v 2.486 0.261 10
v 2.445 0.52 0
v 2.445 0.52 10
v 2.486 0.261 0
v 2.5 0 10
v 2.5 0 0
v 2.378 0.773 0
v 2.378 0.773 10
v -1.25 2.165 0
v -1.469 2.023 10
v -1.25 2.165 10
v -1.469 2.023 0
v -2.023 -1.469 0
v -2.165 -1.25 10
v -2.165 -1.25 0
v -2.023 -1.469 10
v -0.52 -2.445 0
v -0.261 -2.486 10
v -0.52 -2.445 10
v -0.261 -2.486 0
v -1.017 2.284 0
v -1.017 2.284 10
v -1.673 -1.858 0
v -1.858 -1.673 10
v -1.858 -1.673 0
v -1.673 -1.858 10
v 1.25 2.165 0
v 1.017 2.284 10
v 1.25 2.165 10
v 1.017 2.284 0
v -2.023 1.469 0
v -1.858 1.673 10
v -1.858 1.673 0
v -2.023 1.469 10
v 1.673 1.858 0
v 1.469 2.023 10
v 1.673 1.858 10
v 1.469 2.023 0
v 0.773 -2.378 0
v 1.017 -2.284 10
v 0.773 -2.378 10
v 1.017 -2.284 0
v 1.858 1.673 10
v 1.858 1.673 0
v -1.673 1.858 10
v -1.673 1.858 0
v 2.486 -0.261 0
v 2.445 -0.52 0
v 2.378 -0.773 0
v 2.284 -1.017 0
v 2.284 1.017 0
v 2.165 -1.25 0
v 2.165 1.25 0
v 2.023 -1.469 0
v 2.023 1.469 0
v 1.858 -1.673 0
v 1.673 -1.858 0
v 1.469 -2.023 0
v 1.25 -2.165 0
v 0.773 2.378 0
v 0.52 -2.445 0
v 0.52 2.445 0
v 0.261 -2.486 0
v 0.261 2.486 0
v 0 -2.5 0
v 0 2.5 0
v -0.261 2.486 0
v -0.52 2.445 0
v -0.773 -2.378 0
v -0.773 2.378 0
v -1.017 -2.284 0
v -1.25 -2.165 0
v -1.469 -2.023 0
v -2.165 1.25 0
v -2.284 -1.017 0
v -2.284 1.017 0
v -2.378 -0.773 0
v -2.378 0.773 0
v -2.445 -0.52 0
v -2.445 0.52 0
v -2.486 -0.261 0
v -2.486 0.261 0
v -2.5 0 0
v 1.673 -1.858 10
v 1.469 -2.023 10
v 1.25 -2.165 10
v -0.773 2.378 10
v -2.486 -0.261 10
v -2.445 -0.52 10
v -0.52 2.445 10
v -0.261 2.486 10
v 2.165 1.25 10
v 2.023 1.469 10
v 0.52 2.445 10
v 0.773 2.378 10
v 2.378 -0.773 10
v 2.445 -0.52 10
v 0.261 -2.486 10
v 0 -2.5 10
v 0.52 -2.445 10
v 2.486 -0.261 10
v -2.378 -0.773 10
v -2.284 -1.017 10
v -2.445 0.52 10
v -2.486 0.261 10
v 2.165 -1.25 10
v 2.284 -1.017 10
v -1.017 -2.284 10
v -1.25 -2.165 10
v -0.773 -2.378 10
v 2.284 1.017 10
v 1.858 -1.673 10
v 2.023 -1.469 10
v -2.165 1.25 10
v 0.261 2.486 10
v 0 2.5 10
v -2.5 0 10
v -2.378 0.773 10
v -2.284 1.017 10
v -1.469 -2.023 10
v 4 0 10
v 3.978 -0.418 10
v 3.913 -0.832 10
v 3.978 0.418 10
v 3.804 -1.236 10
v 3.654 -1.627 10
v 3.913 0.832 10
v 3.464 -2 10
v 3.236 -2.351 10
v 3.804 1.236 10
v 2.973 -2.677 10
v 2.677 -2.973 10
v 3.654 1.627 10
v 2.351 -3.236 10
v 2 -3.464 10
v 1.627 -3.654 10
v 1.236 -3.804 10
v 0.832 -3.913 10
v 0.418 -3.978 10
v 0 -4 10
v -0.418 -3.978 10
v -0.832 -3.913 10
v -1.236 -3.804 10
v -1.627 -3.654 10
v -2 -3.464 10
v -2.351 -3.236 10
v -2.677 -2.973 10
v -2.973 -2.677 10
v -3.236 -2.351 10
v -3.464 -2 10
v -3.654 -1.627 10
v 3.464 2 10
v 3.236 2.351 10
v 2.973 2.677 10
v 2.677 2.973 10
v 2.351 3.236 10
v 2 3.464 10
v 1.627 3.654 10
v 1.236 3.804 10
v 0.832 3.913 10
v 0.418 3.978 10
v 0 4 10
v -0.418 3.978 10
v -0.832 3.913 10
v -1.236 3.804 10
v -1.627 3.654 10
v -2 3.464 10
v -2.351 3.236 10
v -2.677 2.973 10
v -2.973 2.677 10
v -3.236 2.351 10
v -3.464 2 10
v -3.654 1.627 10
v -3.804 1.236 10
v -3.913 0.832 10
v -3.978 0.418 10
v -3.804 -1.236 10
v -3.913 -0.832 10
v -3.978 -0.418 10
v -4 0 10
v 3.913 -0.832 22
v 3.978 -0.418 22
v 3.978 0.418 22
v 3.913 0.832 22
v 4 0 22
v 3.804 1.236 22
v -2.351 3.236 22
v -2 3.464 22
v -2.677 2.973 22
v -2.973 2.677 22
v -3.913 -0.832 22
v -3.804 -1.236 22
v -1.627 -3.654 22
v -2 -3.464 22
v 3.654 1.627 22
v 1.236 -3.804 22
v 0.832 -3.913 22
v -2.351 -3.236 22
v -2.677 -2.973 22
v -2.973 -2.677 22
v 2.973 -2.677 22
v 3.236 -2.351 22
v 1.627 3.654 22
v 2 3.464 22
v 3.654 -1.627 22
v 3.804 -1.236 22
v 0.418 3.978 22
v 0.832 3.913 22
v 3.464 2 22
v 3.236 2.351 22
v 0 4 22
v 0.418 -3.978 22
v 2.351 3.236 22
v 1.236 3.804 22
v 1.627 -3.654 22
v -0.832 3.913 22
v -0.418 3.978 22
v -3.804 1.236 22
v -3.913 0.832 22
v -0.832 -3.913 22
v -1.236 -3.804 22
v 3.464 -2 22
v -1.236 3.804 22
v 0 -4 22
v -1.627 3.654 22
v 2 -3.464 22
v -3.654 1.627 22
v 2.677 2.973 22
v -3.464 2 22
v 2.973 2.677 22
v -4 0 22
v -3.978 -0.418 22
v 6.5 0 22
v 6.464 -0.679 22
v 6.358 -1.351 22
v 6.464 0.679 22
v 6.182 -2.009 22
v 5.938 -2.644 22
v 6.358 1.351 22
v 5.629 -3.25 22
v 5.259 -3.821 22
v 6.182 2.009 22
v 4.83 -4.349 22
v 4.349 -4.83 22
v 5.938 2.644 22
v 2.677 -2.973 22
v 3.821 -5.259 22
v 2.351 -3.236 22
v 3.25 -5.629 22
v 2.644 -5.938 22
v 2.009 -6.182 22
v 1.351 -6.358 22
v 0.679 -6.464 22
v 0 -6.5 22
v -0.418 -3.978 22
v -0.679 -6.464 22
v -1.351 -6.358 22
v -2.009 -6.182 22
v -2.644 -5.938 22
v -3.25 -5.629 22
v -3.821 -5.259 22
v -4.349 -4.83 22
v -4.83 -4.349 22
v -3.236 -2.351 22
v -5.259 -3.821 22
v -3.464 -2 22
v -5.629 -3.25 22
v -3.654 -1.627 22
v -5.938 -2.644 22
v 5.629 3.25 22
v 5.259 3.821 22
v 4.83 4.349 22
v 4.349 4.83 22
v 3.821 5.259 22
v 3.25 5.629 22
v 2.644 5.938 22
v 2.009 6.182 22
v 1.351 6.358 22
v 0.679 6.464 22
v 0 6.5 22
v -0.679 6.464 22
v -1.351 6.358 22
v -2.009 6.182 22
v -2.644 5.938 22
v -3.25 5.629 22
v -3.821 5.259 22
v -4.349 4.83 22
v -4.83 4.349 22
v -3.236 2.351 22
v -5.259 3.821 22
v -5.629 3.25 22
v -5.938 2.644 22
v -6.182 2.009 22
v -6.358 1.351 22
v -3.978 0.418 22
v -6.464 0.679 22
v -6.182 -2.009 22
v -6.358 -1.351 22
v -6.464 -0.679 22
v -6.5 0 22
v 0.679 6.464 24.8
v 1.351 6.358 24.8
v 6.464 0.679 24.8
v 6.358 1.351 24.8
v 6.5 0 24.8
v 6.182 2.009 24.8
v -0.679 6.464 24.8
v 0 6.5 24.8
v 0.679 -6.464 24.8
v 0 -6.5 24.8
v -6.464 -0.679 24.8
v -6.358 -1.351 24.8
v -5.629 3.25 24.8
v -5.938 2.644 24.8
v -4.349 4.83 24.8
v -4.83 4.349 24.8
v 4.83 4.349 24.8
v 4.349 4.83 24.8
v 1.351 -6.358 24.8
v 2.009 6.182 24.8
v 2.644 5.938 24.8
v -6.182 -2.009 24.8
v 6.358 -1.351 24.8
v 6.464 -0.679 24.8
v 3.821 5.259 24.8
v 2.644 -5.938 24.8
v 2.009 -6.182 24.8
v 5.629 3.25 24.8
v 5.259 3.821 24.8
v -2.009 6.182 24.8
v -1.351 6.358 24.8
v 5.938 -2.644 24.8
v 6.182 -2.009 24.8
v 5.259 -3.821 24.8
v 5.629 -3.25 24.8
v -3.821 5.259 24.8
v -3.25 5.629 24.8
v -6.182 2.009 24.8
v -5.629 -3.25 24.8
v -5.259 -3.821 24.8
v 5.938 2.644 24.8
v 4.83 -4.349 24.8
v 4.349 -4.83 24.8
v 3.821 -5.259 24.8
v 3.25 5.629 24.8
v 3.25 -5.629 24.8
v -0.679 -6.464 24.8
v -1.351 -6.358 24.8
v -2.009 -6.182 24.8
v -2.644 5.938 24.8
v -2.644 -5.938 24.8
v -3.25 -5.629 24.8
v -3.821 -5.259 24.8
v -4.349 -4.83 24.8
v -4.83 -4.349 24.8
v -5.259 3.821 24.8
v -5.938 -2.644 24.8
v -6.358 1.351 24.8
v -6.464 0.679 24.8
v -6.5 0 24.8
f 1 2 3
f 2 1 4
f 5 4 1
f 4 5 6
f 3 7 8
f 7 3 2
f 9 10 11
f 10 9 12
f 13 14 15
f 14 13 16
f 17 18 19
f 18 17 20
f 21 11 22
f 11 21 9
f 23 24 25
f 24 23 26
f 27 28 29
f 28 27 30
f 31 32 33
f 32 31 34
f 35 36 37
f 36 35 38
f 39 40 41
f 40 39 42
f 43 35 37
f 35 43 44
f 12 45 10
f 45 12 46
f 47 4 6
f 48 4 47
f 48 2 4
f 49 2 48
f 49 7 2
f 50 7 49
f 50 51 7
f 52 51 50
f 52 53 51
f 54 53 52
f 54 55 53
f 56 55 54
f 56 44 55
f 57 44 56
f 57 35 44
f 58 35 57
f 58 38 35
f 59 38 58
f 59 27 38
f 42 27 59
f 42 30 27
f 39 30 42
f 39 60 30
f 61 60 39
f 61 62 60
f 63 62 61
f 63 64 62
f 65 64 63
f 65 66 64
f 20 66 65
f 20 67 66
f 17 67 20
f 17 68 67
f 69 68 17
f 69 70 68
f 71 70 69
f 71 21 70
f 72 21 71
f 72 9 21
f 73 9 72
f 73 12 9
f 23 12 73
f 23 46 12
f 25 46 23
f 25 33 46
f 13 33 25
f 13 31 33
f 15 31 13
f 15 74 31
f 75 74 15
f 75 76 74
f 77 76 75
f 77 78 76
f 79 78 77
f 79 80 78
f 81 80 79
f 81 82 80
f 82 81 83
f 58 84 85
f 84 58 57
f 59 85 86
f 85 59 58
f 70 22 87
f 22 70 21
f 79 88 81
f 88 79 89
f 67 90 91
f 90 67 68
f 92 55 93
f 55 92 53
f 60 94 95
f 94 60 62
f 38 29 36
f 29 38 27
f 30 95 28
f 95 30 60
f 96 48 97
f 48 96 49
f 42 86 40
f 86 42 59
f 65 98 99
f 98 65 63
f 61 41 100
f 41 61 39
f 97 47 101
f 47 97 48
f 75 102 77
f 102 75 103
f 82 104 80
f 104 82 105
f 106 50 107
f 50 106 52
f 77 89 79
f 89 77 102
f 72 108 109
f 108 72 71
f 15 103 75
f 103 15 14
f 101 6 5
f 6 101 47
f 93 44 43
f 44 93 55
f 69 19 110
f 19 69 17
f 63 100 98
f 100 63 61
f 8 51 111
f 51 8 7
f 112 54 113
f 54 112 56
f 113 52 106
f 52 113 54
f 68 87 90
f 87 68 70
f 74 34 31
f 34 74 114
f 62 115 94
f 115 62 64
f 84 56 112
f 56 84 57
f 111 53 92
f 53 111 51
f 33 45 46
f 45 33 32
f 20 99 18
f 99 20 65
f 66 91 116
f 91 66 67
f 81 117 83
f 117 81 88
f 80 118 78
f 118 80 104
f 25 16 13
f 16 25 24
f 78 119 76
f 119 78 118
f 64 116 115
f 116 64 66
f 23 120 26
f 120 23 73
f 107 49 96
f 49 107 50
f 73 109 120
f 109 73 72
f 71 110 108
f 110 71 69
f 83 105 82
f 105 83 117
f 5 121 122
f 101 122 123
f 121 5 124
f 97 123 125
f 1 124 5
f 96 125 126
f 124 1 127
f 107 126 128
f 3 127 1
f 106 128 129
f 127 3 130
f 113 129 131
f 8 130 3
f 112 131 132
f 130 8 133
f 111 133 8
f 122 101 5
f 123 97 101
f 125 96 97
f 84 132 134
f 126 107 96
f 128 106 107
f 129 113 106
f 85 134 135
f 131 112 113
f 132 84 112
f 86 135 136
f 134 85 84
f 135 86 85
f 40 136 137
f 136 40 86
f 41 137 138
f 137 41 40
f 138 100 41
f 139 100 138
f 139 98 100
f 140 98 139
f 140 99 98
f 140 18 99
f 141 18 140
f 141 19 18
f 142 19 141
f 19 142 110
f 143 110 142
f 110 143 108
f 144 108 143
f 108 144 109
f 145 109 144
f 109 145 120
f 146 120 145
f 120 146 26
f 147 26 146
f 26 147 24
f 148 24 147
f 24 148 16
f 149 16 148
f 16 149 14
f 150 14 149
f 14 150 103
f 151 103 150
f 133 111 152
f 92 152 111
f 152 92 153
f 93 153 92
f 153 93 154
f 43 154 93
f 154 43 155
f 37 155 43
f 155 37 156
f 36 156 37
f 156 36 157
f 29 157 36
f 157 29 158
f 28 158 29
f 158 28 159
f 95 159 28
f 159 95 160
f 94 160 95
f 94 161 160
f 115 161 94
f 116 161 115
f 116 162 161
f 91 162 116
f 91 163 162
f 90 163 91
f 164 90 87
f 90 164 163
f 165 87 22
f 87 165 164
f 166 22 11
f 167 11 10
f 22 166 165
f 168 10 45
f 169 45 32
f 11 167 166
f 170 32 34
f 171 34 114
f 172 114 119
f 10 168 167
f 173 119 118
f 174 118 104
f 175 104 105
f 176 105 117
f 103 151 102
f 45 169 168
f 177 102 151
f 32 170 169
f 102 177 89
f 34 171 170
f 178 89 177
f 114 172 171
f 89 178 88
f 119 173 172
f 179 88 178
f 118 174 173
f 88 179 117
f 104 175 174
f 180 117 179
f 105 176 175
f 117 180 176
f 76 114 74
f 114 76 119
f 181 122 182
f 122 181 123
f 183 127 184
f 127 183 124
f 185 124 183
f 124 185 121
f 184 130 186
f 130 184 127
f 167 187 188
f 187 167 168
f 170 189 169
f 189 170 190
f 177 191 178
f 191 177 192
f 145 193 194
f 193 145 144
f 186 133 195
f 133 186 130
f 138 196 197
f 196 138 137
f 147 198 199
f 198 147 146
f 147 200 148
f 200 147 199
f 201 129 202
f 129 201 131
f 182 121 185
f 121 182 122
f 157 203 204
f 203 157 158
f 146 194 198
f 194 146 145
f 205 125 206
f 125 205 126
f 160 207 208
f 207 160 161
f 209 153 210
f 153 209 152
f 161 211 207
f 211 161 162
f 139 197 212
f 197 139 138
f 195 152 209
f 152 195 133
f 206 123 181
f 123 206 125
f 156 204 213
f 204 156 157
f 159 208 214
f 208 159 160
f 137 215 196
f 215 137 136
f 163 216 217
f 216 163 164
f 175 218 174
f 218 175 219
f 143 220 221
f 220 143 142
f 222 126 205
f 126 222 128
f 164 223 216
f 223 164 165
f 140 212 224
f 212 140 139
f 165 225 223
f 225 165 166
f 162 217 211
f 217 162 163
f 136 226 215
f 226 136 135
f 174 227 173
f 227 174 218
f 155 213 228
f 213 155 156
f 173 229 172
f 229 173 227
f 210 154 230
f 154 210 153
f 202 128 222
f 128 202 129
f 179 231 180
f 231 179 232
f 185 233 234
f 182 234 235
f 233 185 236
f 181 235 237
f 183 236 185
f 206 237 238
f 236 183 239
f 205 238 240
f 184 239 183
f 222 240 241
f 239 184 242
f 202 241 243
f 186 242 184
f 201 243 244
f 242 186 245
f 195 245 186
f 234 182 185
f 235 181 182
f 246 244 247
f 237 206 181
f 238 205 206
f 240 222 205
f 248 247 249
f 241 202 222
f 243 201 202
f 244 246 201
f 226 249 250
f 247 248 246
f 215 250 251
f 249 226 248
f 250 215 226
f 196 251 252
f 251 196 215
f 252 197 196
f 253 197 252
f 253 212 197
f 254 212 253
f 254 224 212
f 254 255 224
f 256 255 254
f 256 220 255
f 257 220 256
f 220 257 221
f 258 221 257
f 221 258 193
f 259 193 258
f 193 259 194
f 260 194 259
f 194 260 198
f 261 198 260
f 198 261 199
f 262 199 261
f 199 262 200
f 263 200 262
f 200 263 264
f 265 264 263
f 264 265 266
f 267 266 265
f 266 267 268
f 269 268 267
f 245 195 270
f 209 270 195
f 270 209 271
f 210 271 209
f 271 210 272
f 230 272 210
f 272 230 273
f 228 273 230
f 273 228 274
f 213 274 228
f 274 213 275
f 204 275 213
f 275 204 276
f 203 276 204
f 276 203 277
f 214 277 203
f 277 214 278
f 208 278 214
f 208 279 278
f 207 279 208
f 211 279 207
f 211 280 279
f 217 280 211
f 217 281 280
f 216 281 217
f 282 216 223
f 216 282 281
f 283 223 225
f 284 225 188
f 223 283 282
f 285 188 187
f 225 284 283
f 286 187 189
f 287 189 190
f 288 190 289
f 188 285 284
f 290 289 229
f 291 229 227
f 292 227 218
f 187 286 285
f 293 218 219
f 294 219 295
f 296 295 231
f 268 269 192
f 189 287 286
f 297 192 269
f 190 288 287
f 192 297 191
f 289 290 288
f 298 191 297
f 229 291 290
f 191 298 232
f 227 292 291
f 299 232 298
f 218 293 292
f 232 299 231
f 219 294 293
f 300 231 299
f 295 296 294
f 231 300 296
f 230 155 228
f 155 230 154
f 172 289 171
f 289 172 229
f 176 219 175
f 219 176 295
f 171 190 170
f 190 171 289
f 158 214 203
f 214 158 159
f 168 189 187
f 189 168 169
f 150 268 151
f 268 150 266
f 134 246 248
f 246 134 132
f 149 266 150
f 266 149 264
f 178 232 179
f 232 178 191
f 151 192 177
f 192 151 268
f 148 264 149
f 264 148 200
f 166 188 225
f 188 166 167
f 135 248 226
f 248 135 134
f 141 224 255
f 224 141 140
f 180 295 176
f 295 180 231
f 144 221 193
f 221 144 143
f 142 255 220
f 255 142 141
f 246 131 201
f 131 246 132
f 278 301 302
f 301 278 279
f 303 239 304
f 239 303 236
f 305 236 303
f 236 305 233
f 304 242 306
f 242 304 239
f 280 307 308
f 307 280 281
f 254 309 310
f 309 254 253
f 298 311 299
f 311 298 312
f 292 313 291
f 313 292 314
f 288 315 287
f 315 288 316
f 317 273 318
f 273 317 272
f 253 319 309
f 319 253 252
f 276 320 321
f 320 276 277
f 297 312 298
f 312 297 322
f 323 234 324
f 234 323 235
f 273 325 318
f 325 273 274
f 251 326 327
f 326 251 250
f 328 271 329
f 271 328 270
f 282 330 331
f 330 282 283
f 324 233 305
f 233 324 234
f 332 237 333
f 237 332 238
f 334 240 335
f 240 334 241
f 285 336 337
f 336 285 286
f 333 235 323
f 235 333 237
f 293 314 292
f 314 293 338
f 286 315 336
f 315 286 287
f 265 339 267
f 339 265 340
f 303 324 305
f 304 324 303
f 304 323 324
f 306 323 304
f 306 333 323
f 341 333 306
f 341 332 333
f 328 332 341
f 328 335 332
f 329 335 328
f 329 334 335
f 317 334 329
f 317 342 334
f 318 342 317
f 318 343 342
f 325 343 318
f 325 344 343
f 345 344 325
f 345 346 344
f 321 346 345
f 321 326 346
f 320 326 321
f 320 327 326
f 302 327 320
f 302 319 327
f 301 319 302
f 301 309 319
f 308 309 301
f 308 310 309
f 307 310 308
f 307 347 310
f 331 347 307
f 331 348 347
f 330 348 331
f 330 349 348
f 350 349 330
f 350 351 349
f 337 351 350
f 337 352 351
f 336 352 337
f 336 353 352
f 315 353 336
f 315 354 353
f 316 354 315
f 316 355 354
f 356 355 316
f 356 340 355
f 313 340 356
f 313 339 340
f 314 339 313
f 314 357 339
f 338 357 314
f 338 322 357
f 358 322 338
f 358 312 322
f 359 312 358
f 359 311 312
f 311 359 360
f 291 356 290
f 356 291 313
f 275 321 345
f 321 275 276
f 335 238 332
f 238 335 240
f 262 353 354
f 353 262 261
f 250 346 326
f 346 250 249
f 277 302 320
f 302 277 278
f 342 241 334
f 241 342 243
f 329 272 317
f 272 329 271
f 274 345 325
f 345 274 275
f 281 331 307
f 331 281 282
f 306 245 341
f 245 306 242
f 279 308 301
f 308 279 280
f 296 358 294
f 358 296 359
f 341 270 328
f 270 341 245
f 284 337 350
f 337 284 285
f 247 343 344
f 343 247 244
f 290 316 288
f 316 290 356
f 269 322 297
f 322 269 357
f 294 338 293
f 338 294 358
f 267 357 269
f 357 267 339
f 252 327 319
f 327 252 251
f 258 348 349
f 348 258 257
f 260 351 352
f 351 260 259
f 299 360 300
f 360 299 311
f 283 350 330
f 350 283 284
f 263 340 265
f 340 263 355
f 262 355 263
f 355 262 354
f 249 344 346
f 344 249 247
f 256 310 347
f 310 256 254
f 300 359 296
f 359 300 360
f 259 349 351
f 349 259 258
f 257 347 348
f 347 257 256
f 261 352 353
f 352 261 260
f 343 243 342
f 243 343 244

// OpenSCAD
// Shoulder bolt.
$fn = 60;
eps = 0.02;
thread_d = 5;
shoulder_d = 8;
shoulder_l = 12;
thread_l = 10;
head_d = shoulder_d + 5;
union() {
    cylinder(d=thread_d,h=thread_l);
    translate([0,0,thread_l]) cylinder(d=shoulder_d,h=shoulder_l);
    translate([0,0,thread_l+shoulder_l]) cylinder(d=head_d,h=shoulder_d*0.35);
}
